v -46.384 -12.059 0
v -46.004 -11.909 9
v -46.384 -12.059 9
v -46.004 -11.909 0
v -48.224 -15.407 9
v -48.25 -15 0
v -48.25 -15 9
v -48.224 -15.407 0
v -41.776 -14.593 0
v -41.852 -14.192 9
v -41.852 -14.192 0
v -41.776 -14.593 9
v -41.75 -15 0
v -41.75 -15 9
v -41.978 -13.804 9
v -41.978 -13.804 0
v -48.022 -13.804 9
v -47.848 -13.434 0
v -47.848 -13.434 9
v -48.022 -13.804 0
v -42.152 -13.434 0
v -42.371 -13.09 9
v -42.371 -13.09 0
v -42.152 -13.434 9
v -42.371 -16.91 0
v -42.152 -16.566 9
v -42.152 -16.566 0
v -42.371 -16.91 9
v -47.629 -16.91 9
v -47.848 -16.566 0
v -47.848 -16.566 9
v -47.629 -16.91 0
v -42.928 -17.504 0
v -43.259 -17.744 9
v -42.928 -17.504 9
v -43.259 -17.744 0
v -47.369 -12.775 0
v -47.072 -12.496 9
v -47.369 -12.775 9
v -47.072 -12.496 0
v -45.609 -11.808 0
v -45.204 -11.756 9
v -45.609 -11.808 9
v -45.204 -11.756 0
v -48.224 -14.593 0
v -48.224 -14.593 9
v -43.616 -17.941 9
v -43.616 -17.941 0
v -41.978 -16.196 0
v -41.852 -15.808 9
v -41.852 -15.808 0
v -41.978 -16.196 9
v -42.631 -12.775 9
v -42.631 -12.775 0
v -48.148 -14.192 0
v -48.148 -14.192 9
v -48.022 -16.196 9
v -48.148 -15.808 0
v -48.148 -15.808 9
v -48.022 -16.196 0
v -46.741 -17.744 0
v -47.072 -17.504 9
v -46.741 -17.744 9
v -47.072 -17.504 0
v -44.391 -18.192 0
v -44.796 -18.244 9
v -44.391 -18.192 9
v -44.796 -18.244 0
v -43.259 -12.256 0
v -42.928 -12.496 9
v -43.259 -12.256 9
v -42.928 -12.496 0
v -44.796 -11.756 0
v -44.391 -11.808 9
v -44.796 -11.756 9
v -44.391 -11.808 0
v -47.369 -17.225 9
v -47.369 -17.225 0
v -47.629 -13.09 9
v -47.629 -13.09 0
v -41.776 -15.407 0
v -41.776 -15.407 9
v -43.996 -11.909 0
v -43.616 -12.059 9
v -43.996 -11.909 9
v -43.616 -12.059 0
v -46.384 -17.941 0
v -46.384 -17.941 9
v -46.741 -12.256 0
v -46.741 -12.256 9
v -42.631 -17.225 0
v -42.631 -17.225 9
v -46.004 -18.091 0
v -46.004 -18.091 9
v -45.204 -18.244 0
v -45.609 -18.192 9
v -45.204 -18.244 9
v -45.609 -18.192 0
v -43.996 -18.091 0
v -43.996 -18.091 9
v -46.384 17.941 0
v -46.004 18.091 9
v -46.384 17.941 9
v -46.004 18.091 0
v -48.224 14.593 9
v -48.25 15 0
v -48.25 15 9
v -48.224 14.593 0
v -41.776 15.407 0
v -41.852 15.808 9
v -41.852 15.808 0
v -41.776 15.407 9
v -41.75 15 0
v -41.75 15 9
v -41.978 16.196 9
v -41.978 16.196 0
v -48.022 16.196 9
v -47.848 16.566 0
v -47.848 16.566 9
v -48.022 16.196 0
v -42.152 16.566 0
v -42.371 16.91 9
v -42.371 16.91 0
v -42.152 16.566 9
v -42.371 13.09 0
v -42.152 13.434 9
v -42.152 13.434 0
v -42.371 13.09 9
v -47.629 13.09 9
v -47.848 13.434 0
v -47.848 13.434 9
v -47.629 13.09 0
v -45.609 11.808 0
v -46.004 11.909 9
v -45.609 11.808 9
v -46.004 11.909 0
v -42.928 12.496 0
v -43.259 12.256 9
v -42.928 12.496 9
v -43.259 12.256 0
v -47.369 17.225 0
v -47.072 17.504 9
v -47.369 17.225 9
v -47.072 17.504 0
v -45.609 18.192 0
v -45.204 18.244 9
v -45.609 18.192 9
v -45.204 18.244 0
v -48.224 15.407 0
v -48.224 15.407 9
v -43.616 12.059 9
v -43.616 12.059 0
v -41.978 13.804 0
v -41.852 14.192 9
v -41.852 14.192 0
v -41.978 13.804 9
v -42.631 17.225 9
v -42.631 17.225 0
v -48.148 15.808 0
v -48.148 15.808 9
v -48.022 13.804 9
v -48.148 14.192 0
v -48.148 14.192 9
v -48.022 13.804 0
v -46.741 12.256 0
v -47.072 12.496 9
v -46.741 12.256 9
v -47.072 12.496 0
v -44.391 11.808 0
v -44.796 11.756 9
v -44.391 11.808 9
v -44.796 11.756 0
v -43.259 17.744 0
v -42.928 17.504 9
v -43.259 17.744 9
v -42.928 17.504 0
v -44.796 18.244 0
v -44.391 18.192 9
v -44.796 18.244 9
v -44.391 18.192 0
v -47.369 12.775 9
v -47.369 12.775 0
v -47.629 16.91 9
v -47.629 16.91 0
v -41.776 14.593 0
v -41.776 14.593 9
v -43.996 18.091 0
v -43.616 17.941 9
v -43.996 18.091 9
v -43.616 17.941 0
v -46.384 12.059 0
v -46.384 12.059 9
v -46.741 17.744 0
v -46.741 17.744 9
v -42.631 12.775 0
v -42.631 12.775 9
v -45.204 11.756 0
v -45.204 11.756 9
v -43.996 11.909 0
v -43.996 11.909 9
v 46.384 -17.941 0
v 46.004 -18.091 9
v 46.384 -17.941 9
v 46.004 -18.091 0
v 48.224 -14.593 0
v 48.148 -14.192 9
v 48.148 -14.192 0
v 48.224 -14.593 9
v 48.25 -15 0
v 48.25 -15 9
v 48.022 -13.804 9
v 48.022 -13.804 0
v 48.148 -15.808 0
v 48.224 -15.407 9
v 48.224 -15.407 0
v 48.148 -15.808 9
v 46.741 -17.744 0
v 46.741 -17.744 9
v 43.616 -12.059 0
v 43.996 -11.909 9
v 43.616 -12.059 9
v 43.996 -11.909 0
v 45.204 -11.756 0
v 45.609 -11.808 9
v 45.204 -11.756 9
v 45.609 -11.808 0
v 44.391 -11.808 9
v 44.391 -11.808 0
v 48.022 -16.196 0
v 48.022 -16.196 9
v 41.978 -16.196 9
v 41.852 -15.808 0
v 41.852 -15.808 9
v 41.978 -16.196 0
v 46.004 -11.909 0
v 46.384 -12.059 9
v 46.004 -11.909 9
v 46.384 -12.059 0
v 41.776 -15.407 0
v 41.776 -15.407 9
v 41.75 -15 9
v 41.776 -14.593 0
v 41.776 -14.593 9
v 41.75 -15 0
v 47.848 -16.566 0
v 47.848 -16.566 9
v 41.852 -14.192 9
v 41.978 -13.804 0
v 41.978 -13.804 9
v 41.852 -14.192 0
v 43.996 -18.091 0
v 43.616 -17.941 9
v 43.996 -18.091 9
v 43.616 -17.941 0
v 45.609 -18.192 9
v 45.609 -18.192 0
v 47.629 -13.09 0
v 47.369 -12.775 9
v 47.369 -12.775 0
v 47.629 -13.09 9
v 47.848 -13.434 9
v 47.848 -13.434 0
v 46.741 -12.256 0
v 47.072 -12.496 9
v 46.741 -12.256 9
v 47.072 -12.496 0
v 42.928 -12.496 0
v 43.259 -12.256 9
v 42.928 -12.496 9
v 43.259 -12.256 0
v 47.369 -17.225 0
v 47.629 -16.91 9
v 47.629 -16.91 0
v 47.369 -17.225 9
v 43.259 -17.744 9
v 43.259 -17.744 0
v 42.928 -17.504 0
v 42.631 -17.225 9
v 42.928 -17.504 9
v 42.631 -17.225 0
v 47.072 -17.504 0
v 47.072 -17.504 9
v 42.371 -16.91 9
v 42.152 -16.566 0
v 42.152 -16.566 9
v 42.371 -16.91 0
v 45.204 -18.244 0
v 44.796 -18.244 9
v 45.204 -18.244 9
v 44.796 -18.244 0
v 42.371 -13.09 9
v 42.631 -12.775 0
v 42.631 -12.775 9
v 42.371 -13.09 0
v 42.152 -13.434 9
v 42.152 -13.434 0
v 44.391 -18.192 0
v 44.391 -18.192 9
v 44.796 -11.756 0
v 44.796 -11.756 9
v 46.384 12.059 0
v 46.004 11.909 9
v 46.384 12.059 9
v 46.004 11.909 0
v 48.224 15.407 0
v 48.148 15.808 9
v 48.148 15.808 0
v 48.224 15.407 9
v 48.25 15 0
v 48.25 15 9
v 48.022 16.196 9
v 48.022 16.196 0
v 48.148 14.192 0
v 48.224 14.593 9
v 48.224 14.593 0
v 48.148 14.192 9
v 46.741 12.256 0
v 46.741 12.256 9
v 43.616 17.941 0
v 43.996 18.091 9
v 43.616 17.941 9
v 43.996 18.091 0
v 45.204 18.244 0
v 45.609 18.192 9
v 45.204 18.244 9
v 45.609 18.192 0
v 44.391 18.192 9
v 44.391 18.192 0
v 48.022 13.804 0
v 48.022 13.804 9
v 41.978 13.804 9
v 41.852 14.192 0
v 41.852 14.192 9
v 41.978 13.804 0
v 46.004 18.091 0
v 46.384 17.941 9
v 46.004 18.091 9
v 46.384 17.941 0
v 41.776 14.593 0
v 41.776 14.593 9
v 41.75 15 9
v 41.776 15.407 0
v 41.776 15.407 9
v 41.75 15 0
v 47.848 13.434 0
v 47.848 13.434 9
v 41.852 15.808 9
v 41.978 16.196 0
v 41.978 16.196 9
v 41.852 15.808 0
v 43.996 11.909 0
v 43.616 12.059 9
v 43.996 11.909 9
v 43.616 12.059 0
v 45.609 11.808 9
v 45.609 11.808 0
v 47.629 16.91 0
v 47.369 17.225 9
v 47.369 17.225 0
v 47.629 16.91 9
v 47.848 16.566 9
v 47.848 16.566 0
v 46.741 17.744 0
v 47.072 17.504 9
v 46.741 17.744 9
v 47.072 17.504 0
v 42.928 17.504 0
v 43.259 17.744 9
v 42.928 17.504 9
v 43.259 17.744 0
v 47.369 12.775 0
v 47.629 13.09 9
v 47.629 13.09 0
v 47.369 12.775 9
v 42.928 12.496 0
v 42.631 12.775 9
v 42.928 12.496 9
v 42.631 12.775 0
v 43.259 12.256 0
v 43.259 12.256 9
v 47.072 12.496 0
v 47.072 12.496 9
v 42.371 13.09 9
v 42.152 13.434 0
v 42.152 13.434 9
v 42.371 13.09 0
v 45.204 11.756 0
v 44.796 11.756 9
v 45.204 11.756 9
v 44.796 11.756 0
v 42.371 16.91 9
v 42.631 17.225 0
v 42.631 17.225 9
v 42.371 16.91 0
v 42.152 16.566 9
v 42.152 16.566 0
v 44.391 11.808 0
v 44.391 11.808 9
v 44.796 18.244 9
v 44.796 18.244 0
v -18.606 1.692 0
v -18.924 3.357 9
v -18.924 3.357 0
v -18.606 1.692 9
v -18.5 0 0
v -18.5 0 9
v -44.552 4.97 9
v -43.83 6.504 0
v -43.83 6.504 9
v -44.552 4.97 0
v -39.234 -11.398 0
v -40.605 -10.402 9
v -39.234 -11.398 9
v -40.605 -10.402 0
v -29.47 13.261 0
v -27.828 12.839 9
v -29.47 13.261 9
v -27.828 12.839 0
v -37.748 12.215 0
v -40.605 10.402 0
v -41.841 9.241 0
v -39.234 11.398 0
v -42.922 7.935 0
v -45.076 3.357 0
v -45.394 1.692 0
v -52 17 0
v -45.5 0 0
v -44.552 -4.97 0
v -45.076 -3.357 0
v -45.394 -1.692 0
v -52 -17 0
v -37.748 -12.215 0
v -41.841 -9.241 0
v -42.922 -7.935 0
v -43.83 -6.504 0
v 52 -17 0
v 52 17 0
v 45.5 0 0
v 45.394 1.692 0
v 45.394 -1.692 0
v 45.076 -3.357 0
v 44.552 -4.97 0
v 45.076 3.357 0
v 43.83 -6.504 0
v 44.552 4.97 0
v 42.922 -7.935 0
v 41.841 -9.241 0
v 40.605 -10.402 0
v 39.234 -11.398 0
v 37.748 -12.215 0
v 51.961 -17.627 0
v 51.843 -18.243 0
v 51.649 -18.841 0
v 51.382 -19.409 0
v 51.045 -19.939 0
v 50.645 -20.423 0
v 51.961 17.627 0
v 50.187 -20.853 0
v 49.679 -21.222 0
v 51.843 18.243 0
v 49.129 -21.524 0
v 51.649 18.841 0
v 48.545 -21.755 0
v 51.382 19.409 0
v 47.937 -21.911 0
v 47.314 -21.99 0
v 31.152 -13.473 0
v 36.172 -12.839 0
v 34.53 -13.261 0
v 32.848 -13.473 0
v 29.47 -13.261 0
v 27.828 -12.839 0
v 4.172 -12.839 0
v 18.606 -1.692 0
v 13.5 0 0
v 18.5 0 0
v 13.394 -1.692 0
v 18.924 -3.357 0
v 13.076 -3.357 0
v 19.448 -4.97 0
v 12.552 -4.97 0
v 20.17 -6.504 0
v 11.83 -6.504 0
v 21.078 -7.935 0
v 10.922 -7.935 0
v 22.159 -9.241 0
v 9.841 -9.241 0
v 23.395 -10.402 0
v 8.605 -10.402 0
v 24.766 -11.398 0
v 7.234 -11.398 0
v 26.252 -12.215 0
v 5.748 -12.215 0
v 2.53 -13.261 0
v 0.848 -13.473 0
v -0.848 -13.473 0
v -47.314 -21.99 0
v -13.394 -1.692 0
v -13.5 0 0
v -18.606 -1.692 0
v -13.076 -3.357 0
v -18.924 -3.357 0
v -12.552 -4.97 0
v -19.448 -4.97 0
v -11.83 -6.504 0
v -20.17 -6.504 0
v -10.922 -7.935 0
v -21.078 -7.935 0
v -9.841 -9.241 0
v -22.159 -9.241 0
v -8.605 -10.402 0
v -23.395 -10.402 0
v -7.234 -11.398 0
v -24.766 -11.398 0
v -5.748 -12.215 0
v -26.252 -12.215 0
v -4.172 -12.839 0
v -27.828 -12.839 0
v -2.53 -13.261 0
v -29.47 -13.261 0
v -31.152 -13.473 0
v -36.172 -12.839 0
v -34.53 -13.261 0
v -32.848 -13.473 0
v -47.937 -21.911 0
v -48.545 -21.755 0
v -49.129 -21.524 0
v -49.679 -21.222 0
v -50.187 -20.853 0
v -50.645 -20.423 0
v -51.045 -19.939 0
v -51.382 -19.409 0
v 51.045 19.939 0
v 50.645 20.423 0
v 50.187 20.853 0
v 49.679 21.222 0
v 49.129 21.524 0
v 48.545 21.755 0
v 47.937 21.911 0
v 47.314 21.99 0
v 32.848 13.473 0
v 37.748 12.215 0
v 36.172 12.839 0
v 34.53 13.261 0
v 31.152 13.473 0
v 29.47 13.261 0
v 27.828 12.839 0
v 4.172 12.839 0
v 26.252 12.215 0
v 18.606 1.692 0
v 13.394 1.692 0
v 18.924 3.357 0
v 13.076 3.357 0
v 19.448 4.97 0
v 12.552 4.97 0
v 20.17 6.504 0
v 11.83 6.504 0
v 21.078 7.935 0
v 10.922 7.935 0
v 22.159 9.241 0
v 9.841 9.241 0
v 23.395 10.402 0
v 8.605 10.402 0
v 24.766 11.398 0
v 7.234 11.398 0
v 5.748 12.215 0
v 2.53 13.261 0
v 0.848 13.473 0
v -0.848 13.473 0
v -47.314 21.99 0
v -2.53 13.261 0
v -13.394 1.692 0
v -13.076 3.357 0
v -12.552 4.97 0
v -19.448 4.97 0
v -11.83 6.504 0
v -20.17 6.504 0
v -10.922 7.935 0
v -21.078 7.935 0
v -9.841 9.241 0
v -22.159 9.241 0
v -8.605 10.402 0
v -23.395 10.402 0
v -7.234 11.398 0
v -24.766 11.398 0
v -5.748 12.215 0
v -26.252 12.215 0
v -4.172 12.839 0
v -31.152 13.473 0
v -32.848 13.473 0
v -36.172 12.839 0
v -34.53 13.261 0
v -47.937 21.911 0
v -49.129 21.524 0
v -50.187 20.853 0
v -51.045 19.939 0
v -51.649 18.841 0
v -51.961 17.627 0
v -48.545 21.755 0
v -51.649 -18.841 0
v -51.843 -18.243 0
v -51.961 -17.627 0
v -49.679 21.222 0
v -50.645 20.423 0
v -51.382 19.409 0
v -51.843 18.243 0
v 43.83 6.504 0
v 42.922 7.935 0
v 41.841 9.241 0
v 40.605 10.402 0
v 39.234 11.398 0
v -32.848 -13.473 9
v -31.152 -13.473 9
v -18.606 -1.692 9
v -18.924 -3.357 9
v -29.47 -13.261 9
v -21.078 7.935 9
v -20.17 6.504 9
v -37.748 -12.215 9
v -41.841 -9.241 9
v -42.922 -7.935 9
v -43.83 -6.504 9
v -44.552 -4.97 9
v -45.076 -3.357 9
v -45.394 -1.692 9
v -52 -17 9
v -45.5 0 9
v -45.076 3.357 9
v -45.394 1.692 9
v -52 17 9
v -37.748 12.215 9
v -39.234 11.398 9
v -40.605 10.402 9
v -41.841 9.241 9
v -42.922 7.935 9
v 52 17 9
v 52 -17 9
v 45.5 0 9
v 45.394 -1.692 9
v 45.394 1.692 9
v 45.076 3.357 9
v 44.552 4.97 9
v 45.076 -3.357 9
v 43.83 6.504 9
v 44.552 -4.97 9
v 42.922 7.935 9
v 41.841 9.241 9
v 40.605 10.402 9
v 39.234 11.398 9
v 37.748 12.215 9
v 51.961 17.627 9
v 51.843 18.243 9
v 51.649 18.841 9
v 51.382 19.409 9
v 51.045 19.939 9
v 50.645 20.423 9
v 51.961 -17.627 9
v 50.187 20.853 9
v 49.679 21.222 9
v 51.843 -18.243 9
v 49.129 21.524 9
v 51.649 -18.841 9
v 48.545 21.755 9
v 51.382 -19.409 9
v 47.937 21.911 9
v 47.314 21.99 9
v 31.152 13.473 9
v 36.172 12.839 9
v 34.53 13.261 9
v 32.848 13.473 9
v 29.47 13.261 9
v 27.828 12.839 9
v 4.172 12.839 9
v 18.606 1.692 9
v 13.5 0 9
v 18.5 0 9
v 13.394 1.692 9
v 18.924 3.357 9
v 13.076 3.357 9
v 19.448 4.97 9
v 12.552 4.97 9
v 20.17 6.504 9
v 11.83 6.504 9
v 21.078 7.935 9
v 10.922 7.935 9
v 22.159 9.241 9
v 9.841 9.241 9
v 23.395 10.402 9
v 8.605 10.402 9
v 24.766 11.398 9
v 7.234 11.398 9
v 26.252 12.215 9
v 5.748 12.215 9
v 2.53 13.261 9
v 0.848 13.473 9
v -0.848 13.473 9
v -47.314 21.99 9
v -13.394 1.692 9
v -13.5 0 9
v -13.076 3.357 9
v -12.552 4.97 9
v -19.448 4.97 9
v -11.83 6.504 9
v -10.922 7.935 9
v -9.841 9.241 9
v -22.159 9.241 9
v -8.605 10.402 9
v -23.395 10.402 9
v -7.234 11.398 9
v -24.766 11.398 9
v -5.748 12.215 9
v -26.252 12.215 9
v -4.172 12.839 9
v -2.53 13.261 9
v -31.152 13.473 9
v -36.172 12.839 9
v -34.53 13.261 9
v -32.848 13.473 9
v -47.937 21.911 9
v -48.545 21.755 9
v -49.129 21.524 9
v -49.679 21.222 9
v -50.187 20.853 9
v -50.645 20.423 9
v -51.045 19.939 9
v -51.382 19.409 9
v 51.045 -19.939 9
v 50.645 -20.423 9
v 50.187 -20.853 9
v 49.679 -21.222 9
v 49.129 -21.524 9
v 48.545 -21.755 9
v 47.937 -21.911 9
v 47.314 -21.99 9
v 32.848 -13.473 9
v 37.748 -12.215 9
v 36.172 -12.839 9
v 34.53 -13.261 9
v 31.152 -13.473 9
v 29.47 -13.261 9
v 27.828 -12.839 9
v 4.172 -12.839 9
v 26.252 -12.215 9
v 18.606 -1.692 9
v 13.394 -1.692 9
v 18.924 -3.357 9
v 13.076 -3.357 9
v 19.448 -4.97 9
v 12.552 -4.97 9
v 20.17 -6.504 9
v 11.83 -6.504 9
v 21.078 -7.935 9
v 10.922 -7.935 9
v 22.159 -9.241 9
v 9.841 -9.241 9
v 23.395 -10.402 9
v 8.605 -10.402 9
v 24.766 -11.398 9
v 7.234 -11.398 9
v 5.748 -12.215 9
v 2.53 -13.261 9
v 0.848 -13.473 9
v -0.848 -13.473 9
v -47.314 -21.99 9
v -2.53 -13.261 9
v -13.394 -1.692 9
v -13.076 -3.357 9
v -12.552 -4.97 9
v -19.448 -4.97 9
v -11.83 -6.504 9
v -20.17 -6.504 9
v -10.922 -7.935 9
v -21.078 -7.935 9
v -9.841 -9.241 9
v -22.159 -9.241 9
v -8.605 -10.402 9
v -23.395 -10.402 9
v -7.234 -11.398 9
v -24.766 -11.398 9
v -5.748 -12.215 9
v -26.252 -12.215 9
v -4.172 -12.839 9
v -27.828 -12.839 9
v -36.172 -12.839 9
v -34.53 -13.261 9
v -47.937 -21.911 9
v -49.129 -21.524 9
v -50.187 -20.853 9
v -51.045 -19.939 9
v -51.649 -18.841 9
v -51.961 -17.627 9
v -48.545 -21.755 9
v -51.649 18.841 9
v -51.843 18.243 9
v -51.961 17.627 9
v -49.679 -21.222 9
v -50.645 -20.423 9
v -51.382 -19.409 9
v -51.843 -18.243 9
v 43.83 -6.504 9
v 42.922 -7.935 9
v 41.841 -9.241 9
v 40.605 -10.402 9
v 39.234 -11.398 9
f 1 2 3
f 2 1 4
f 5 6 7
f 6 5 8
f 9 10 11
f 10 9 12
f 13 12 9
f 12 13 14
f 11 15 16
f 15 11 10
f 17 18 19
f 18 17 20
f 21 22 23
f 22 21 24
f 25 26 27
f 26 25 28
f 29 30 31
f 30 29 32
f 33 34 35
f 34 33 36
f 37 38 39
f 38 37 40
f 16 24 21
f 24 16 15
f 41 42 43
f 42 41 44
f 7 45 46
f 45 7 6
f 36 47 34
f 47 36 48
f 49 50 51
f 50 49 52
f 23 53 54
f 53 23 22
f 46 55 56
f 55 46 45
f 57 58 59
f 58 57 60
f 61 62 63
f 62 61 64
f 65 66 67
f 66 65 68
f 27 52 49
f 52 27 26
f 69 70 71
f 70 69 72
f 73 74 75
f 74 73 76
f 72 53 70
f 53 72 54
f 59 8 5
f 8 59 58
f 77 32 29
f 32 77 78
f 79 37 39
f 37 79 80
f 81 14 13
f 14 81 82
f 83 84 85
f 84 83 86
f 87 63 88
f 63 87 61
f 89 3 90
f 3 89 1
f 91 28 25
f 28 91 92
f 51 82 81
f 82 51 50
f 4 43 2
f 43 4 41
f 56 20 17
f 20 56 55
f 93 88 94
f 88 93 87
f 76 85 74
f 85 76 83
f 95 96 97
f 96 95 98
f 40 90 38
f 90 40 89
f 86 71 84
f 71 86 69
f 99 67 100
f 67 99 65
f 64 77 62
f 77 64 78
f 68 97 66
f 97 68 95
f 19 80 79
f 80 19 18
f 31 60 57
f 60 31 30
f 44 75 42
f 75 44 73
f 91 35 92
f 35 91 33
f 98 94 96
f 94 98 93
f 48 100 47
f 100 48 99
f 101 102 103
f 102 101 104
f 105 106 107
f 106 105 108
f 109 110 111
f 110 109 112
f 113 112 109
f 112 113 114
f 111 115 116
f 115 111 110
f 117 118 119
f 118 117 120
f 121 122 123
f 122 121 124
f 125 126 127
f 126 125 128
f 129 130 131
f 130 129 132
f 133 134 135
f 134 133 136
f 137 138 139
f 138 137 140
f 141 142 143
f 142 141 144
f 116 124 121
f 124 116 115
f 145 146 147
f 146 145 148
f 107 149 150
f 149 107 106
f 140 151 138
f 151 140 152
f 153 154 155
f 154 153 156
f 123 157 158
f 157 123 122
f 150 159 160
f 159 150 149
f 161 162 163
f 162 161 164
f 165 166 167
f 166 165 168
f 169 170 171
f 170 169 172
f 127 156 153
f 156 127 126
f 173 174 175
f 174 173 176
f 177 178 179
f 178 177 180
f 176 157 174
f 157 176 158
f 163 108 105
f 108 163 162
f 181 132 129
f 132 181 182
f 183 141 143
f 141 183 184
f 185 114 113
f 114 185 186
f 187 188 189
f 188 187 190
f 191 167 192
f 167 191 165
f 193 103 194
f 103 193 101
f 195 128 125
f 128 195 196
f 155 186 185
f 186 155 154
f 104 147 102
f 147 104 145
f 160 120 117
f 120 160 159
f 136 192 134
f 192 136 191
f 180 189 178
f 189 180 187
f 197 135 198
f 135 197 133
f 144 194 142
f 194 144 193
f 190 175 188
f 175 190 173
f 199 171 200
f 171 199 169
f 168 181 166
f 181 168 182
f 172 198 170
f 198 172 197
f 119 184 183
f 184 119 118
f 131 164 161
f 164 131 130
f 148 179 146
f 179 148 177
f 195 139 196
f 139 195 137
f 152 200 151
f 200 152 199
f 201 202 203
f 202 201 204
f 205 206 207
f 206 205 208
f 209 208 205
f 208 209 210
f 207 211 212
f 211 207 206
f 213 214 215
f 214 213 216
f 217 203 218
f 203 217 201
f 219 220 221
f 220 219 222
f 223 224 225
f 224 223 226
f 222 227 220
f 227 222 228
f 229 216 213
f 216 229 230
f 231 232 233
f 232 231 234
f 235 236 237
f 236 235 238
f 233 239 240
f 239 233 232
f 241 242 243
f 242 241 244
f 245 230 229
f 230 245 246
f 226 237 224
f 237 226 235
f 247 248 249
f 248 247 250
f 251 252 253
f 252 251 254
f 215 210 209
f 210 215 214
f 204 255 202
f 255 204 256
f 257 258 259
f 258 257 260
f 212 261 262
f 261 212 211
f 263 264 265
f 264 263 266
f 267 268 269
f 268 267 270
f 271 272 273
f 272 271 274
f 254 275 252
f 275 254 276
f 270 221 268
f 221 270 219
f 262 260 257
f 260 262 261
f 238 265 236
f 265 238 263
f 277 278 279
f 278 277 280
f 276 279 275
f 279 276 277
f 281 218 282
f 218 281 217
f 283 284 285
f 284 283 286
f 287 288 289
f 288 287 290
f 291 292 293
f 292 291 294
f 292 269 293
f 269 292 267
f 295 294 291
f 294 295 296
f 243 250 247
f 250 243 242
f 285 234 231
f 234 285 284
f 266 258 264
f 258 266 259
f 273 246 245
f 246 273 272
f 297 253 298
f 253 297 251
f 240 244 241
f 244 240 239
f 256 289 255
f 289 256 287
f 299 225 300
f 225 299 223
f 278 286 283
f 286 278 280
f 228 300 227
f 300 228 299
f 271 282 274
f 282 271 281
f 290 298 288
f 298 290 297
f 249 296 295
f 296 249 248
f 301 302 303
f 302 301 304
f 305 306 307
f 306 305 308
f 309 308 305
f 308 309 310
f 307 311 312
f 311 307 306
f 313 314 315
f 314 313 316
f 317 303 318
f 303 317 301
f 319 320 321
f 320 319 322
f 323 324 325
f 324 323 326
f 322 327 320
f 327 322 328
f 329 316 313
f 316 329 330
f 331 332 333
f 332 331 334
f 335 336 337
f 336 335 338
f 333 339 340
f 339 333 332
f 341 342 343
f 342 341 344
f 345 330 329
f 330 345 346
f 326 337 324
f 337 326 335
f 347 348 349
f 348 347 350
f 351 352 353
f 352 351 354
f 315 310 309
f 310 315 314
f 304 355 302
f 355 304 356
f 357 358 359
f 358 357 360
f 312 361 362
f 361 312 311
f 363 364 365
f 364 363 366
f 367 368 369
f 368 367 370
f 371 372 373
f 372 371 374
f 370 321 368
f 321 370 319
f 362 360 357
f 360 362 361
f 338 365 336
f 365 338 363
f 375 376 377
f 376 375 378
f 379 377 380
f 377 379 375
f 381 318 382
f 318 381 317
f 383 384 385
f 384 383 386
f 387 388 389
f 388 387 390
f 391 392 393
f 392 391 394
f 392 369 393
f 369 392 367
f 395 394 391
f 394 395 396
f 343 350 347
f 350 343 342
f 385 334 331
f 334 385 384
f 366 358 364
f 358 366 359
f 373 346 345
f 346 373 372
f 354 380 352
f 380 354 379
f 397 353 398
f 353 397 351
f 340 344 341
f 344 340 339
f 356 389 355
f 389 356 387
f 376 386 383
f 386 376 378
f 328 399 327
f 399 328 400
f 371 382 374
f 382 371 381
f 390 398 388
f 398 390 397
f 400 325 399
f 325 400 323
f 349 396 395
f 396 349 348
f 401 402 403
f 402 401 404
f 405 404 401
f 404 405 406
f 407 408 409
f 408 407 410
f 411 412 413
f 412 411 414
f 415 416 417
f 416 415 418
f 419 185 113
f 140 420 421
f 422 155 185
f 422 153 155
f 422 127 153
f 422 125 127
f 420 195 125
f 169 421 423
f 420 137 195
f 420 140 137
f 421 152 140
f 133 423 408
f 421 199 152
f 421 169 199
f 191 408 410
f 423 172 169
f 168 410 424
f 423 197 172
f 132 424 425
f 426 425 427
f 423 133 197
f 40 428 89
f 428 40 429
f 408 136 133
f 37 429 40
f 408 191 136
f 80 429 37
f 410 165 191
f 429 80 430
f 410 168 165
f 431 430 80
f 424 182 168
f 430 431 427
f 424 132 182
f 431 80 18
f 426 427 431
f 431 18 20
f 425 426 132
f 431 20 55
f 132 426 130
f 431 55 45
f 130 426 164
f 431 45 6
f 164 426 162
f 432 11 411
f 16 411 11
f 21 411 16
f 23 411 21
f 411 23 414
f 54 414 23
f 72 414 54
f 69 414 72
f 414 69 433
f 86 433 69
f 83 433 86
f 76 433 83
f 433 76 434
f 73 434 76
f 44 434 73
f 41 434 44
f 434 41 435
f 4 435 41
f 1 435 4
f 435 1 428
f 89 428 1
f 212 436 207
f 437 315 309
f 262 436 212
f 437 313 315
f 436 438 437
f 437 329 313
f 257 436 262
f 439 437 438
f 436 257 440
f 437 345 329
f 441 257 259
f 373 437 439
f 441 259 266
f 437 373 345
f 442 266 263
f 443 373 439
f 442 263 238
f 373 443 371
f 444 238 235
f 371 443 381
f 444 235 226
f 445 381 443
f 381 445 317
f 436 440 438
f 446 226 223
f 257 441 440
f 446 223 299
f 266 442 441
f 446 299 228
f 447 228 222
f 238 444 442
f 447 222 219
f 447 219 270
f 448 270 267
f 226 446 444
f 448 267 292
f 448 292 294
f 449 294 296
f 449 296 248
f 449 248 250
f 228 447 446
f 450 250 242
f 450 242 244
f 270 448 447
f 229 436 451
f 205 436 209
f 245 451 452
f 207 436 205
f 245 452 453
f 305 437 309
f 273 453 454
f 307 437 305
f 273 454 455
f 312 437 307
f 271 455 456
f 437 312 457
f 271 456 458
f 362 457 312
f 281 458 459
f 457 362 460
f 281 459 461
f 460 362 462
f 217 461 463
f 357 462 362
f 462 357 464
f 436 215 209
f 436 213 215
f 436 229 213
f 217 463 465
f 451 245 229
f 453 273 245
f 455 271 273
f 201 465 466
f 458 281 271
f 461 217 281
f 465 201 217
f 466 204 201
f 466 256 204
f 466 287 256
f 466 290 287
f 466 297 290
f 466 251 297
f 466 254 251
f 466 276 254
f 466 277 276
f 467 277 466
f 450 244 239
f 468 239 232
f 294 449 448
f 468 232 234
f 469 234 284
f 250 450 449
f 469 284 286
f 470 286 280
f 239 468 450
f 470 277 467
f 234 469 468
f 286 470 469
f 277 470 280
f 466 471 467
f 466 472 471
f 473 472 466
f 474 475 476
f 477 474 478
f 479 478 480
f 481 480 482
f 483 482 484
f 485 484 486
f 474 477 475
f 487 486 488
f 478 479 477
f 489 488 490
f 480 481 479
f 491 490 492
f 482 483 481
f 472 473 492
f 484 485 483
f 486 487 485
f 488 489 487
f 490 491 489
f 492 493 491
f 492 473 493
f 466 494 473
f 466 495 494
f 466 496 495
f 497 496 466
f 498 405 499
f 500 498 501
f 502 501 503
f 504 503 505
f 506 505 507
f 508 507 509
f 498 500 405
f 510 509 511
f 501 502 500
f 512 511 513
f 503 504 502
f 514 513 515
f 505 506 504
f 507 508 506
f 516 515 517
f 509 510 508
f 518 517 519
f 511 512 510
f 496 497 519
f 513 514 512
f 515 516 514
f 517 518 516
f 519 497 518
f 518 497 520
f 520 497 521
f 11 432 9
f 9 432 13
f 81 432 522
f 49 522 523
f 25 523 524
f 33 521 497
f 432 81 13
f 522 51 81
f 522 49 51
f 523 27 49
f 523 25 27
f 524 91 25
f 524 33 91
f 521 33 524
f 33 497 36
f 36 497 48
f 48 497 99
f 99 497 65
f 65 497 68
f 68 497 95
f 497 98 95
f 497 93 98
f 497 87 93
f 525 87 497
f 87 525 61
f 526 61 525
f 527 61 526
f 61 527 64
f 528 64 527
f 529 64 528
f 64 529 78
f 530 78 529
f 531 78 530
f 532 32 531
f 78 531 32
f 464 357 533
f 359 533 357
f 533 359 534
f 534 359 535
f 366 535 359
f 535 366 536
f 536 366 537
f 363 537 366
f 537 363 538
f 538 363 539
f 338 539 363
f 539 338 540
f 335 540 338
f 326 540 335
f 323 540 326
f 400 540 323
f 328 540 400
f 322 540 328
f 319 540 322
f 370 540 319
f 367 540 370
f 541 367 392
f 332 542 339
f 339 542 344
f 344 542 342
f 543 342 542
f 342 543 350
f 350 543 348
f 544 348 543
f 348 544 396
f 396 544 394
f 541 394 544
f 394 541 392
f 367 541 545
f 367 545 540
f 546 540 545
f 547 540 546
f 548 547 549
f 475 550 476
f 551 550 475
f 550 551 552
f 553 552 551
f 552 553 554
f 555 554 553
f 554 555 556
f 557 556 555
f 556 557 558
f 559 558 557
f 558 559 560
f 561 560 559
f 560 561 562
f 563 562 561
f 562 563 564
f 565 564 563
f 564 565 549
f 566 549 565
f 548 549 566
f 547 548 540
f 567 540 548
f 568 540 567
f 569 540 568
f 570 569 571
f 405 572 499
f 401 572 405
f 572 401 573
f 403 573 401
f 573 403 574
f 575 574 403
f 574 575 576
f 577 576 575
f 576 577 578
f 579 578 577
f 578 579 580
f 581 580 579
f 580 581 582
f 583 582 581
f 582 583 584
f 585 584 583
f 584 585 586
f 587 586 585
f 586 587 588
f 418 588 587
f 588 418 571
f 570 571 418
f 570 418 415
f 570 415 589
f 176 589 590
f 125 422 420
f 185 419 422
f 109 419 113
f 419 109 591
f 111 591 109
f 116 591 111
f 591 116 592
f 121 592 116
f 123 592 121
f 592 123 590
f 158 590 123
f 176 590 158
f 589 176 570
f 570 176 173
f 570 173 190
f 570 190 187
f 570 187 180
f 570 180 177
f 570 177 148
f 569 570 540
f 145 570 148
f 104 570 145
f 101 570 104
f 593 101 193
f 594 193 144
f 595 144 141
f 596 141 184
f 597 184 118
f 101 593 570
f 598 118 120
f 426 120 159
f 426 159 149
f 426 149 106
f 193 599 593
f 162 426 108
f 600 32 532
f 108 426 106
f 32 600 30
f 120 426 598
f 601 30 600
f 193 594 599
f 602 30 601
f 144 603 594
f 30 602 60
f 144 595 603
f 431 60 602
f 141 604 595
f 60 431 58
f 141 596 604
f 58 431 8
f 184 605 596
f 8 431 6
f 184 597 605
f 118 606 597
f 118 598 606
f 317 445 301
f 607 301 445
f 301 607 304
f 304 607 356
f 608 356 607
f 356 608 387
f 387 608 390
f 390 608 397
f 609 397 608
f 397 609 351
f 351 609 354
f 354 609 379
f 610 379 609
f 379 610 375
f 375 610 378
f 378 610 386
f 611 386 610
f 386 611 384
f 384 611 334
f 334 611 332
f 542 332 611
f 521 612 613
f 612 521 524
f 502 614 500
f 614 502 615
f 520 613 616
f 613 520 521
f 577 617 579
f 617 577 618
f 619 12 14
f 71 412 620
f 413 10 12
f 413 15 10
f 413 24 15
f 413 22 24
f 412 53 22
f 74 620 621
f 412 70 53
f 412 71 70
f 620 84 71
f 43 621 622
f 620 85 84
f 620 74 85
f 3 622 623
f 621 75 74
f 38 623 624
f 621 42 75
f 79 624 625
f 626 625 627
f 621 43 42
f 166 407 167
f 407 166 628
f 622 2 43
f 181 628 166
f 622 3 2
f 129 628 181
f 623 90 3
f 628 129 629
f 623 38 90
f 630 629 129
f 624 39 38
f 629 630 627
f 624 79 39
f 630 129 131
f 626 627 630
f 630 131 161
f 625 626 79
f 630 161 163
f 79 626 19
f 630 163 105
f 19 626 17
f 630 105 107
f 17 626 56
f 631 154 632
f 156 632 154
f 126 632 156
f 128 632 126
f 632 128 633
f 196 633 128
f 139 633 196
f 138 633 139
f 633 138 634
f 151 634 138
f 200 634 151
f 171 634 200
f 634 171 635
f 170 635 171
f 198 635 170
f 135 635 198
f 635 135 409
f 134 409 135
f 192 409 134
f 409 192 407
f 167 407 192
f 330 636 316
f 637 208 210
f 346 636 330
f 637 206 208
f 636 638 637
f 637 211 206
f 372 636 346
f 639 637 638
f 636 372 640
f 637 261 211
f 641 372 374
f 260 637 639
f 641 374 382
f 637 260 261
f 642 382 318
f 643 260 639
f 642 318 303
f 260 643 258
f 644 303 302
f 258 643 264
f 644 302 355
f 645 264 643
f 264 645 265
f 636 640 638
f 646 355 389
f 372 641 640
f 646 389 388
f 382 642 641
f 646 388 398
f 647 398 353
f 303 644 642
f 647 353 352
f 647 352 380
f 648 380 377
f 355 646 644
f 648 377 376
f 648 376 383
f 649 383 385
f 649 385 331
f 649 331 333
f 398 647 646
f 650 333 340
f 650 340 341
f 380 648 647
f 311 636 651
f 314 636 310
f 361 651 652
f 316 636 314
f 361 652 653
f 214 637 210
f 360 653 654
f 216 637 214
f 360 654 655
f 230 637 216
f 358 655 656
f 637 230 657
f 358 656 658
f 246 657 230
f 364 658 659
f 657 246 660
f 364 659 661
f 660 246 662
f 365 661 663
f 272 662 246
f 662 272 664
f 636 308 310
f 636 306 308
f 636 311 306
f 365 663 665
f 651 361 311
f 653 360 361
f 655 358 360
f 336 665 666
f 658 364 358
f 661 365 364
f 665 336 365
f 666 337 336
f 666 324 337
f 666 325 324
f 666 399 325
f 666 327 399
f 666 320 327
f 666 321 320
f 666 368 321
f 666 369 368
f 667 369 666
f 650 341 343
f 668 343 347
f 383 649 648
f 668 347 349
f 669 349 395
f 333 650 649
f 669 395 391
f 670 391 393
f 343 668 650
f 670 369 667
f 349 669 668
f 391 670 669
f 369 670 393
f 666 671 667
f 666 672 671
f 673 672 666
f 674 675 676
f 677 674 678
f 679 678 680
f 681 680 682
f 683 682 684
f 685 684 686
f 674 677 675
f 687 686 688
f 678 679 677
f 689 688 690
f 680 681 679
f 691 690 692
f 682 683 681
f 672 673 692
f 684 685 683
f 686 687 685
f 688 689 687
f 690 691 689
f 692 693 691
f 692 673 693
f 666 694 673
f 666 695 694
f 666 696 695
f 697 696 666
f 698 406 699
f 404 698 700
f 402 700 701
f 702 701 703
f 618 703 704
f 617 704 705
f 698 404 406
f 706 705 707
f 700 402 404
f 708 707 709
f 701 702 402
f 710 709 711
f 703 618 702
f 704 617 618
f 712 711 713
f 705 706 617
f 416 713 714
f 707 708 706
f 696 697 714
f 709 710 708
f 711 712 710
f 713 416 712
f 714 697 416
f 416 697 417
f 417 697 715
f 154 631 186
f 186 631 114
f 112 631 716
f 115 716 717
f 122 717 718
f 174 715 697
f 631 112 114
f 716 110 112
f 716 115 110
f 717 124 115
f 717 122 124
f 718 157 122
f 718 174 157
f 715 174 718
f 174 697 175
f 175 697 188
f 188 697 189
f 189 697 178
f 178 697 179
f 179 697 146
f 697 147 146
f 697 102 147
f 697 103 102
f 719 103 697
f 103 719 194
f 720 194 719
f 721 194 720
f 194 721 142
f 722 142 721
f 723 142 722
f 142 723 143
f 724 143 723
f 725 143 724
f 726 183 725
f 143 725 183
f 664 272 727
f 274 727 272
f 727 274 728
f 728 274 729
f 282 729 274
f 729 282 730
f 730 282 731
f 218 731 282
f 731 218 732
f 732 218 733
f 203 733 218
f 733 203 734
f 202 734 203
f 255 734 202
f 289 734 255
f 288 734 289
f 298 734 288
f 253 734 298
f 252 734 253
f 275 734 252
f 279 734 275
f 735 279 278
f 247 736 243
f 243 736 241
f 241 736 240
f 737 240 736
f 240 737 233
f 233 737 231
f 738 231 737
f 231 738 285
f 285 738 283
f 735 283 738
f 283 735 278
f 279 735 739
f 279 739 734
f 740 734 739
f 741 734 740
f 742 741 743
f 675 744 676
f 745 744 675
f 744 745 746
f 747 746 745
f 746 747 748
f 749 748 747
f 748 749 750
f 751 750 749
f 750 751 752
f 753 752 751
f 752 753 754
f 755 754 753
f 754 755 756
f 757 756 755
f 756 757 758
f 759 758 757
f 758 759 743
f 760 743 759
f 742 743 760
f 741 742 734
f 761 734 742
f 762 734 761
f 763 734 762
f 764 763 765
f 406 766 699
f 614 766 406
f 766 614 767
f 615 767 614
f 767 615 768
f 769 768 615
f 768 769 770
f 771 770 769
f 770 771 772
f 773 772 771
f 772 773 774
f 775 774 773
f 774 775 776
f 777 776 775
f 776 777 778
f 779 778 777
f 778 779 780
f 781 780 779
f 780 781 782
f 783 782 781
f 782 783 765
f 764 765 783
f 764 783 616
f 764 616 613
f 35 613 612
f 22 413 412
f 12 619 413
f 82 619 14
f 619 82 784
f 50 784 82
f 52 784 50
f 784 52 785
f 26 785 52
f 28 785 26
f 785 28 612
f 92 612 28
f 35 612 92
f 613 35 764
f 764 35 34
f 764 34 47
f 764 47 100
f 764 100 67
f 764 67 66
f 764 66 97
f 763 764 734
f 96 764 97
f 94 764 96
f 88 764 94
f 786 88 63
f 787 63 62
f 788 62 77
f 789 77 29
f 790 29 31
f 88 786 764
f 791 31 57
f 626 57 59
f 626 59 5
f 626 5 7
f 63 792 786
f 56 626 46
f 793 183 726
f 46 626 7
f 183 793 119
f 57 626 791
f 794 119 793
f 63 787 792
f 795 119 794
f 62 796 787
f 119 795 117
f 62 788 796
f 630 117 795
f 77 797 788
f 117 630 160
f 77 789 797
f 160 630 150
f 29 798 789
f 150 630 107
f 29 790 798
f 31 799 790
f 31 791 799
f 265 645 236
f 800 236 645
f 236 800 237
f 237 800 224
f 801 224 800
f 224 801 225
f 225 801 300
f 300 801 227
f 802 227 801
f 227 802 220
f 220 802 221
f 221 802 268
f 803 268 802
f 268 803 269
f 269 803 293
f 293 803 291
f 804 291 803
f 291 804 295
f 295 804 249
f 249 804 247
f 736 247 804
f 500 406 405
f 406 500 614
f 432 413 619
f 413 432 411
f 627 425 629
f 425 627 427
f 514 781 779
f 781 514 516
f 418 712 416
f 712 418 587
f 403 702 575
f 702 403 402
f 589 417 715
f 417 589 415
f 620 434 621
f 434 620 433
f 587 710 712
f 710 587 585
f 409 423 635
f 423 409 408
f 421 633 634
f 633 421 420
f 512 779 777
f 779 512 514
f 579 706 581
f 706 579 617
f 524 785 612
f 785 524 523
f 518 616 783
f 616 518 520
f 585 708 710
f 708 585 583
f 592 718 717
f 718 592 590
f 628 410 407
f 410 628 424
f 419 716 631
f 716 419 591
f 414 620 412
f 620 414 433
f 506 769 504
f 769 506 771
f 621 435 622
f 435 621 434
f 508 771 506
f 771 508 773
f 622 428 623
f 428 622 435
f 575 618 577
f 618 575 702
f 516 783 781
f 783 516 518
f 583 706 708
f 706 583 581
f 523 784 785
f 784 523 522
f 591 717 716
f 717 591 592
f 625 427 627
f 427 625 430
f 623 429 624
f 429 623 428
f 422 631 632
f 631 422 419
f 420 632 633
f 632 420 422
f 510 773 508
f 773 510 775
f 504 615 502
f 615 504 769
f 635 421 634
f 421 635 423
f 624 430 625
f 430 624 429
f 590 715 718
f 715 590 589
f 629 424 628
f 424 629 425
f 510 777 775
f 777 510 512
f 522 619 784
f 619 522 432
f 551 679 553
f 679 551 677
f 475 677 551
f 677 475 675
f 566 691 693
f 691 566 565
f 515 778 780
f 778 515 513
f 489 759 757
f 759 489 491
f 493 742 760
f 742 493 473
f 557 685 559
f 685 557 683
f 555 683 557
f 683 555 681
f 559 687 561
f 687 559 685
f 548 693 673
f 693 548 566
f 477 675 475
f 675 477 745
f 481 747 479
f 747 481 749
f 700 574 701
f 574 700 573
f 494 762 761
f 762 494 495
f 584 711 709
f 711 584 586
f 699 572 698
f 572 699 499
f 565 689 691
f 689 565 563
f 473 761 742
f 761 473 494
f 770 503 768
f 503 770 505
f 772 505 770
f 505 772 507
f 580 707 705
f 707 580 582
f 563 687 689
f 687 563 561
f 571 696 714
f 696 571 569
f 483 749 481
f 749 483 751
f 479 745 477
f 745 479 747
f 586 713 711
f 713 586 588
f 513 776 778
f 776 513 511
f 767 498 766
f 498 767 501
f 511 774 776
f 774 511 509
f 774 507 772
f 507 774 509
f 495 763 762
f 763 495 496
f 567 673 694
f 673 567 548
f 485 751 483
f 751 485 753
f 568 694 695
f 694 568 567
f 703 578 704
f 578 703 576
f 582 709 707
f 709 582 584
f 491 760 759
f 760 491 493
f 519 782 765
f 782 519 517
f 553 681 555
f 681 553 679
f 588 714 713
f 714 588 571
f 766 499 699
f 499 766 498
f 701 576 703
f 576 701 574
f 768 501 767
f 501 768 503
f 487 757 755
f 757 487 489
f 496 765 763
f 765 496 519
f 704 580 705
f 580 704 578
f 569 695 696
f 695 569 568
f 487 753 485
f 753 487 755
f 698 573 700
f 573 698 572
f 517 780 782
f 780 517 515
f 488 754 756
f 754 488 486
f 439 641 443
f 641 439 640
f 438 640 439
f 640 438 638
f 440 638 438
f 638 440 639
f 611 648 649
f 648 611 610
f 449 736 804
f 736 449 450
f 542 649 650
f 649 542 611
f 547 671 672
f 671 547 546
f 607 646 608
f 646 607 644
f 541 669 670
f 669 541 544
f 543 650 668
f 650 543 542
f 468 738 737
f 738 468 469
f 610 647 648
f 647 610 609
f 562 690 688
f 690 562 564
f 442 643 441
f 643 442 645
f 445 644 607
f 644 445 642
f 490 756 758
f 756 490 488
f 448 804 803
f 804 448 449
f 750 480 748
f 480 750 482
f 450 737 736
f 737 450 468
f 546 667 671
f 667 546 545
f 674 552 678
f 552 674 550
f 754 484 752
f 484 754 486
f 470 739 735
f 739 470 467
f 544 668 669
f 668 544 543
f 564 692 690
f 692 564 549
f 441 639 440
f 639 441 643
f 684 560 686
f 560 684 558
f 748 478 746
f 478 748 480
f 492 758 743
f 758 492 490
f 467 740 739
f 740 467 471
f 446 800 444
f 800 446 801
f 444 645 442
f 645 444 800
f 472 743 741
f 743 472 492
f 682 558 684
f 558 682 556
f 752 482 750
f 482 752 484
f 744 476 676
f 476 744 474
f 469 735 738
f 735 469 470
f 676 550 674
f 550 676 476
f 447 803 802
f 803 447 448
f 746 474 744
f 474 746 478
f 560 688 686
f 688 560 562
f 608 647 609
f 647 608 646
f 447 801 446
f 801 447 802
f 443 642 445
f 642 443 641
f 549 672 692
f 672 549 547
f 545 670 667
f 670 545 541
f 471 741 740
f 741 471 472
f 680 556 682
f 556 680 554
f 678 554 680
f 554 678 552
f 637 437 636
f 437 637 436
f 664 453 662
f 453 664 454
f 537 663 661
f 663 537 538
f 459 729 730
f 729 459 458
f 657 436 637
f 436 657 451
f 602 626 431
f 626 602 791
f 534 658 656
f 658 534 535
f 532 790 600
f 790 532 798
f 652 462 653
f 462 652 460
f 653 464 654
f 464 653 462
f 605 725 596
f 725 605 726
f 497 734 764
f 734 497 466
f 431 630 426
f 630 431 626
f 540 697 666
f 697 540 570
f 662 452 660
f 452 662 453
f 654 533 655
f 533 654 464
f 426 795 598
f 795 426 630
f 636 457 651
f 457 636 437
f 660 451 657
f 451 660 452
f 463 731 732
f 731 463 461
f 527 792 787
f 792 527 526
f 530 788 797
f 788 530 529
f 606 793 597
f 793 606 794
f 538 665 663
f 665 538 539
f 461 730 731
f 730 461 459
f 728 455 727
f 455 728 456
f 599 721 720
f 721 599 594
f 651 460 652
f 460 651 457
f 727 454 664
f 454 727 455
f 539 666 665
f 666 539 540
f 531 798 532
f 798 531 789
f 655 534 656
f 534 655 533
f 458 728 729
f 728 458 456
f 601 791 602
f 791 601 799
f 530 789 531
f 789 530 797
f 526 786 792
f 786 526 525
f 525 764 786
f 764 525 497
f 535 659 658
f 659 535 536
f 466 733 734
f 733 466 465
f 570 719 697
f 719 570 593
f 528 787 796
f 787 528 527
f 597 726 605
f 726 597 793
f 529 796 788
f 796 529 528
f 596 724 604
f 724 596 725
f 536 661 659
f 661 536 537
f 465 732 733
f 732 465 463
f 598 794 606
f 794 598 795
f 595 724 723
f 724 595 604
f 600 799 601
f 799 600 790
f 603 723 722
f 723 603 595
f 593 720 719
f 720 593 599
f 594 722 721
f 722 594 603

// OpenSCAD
$fn = 50;


difference() {
	union() {
		hull() {
			translate(v = [-47.0000000000, 17.0000000000, 0]) {
				cylinder(h = 9, r = 5);
			}
			translate(v = [47.0000000000, 17.0000000000, 0]) {
				cylinder(h = 9, r = 5);
			}
			translate(v = [-47.0000000000, -17.0000000000, 0]) {
				cylinder(h = 9, r = 5);
			}
			translate(v = [47.0000000000, -17.0000000000, 0]) {
				cylinder(h = 9, r = 5);
			}
		}
	}
	union() {
		#translate(v = [-45.0000000000, -15.0000000000, -100.0000000000]) {
			cylinder(h = 200, r = 3.2500000000);
		}
		#translate(v = [-45.0000000000, 15.0000000000, -100.0000000000]) {
			cylinder(h = 200, r = 3.2500000000);
		}
		#translate(v = [45.0000000000, -15.0000000000, -100.0000000000]) {
			cylinder(h = 200, r = 3.2500000000);
		}
		#translate(v = [45.0000000000, 15.0000000000, -100.0000000000]) {
			cylinder(h = 200, r = 3.2500000000);
		}
		#translate(v = [-32.0000000000, 0, 0]) {
			cylinder(h = 9, r = 13.5000000000);
		}
		#cylinder(h = 9, r = 13.5000000000);
		#translate(v = [32.0000000000, 0, 0]) {
			cylinder(h = 9, r = 13.5000000000);
		}
	}
}
